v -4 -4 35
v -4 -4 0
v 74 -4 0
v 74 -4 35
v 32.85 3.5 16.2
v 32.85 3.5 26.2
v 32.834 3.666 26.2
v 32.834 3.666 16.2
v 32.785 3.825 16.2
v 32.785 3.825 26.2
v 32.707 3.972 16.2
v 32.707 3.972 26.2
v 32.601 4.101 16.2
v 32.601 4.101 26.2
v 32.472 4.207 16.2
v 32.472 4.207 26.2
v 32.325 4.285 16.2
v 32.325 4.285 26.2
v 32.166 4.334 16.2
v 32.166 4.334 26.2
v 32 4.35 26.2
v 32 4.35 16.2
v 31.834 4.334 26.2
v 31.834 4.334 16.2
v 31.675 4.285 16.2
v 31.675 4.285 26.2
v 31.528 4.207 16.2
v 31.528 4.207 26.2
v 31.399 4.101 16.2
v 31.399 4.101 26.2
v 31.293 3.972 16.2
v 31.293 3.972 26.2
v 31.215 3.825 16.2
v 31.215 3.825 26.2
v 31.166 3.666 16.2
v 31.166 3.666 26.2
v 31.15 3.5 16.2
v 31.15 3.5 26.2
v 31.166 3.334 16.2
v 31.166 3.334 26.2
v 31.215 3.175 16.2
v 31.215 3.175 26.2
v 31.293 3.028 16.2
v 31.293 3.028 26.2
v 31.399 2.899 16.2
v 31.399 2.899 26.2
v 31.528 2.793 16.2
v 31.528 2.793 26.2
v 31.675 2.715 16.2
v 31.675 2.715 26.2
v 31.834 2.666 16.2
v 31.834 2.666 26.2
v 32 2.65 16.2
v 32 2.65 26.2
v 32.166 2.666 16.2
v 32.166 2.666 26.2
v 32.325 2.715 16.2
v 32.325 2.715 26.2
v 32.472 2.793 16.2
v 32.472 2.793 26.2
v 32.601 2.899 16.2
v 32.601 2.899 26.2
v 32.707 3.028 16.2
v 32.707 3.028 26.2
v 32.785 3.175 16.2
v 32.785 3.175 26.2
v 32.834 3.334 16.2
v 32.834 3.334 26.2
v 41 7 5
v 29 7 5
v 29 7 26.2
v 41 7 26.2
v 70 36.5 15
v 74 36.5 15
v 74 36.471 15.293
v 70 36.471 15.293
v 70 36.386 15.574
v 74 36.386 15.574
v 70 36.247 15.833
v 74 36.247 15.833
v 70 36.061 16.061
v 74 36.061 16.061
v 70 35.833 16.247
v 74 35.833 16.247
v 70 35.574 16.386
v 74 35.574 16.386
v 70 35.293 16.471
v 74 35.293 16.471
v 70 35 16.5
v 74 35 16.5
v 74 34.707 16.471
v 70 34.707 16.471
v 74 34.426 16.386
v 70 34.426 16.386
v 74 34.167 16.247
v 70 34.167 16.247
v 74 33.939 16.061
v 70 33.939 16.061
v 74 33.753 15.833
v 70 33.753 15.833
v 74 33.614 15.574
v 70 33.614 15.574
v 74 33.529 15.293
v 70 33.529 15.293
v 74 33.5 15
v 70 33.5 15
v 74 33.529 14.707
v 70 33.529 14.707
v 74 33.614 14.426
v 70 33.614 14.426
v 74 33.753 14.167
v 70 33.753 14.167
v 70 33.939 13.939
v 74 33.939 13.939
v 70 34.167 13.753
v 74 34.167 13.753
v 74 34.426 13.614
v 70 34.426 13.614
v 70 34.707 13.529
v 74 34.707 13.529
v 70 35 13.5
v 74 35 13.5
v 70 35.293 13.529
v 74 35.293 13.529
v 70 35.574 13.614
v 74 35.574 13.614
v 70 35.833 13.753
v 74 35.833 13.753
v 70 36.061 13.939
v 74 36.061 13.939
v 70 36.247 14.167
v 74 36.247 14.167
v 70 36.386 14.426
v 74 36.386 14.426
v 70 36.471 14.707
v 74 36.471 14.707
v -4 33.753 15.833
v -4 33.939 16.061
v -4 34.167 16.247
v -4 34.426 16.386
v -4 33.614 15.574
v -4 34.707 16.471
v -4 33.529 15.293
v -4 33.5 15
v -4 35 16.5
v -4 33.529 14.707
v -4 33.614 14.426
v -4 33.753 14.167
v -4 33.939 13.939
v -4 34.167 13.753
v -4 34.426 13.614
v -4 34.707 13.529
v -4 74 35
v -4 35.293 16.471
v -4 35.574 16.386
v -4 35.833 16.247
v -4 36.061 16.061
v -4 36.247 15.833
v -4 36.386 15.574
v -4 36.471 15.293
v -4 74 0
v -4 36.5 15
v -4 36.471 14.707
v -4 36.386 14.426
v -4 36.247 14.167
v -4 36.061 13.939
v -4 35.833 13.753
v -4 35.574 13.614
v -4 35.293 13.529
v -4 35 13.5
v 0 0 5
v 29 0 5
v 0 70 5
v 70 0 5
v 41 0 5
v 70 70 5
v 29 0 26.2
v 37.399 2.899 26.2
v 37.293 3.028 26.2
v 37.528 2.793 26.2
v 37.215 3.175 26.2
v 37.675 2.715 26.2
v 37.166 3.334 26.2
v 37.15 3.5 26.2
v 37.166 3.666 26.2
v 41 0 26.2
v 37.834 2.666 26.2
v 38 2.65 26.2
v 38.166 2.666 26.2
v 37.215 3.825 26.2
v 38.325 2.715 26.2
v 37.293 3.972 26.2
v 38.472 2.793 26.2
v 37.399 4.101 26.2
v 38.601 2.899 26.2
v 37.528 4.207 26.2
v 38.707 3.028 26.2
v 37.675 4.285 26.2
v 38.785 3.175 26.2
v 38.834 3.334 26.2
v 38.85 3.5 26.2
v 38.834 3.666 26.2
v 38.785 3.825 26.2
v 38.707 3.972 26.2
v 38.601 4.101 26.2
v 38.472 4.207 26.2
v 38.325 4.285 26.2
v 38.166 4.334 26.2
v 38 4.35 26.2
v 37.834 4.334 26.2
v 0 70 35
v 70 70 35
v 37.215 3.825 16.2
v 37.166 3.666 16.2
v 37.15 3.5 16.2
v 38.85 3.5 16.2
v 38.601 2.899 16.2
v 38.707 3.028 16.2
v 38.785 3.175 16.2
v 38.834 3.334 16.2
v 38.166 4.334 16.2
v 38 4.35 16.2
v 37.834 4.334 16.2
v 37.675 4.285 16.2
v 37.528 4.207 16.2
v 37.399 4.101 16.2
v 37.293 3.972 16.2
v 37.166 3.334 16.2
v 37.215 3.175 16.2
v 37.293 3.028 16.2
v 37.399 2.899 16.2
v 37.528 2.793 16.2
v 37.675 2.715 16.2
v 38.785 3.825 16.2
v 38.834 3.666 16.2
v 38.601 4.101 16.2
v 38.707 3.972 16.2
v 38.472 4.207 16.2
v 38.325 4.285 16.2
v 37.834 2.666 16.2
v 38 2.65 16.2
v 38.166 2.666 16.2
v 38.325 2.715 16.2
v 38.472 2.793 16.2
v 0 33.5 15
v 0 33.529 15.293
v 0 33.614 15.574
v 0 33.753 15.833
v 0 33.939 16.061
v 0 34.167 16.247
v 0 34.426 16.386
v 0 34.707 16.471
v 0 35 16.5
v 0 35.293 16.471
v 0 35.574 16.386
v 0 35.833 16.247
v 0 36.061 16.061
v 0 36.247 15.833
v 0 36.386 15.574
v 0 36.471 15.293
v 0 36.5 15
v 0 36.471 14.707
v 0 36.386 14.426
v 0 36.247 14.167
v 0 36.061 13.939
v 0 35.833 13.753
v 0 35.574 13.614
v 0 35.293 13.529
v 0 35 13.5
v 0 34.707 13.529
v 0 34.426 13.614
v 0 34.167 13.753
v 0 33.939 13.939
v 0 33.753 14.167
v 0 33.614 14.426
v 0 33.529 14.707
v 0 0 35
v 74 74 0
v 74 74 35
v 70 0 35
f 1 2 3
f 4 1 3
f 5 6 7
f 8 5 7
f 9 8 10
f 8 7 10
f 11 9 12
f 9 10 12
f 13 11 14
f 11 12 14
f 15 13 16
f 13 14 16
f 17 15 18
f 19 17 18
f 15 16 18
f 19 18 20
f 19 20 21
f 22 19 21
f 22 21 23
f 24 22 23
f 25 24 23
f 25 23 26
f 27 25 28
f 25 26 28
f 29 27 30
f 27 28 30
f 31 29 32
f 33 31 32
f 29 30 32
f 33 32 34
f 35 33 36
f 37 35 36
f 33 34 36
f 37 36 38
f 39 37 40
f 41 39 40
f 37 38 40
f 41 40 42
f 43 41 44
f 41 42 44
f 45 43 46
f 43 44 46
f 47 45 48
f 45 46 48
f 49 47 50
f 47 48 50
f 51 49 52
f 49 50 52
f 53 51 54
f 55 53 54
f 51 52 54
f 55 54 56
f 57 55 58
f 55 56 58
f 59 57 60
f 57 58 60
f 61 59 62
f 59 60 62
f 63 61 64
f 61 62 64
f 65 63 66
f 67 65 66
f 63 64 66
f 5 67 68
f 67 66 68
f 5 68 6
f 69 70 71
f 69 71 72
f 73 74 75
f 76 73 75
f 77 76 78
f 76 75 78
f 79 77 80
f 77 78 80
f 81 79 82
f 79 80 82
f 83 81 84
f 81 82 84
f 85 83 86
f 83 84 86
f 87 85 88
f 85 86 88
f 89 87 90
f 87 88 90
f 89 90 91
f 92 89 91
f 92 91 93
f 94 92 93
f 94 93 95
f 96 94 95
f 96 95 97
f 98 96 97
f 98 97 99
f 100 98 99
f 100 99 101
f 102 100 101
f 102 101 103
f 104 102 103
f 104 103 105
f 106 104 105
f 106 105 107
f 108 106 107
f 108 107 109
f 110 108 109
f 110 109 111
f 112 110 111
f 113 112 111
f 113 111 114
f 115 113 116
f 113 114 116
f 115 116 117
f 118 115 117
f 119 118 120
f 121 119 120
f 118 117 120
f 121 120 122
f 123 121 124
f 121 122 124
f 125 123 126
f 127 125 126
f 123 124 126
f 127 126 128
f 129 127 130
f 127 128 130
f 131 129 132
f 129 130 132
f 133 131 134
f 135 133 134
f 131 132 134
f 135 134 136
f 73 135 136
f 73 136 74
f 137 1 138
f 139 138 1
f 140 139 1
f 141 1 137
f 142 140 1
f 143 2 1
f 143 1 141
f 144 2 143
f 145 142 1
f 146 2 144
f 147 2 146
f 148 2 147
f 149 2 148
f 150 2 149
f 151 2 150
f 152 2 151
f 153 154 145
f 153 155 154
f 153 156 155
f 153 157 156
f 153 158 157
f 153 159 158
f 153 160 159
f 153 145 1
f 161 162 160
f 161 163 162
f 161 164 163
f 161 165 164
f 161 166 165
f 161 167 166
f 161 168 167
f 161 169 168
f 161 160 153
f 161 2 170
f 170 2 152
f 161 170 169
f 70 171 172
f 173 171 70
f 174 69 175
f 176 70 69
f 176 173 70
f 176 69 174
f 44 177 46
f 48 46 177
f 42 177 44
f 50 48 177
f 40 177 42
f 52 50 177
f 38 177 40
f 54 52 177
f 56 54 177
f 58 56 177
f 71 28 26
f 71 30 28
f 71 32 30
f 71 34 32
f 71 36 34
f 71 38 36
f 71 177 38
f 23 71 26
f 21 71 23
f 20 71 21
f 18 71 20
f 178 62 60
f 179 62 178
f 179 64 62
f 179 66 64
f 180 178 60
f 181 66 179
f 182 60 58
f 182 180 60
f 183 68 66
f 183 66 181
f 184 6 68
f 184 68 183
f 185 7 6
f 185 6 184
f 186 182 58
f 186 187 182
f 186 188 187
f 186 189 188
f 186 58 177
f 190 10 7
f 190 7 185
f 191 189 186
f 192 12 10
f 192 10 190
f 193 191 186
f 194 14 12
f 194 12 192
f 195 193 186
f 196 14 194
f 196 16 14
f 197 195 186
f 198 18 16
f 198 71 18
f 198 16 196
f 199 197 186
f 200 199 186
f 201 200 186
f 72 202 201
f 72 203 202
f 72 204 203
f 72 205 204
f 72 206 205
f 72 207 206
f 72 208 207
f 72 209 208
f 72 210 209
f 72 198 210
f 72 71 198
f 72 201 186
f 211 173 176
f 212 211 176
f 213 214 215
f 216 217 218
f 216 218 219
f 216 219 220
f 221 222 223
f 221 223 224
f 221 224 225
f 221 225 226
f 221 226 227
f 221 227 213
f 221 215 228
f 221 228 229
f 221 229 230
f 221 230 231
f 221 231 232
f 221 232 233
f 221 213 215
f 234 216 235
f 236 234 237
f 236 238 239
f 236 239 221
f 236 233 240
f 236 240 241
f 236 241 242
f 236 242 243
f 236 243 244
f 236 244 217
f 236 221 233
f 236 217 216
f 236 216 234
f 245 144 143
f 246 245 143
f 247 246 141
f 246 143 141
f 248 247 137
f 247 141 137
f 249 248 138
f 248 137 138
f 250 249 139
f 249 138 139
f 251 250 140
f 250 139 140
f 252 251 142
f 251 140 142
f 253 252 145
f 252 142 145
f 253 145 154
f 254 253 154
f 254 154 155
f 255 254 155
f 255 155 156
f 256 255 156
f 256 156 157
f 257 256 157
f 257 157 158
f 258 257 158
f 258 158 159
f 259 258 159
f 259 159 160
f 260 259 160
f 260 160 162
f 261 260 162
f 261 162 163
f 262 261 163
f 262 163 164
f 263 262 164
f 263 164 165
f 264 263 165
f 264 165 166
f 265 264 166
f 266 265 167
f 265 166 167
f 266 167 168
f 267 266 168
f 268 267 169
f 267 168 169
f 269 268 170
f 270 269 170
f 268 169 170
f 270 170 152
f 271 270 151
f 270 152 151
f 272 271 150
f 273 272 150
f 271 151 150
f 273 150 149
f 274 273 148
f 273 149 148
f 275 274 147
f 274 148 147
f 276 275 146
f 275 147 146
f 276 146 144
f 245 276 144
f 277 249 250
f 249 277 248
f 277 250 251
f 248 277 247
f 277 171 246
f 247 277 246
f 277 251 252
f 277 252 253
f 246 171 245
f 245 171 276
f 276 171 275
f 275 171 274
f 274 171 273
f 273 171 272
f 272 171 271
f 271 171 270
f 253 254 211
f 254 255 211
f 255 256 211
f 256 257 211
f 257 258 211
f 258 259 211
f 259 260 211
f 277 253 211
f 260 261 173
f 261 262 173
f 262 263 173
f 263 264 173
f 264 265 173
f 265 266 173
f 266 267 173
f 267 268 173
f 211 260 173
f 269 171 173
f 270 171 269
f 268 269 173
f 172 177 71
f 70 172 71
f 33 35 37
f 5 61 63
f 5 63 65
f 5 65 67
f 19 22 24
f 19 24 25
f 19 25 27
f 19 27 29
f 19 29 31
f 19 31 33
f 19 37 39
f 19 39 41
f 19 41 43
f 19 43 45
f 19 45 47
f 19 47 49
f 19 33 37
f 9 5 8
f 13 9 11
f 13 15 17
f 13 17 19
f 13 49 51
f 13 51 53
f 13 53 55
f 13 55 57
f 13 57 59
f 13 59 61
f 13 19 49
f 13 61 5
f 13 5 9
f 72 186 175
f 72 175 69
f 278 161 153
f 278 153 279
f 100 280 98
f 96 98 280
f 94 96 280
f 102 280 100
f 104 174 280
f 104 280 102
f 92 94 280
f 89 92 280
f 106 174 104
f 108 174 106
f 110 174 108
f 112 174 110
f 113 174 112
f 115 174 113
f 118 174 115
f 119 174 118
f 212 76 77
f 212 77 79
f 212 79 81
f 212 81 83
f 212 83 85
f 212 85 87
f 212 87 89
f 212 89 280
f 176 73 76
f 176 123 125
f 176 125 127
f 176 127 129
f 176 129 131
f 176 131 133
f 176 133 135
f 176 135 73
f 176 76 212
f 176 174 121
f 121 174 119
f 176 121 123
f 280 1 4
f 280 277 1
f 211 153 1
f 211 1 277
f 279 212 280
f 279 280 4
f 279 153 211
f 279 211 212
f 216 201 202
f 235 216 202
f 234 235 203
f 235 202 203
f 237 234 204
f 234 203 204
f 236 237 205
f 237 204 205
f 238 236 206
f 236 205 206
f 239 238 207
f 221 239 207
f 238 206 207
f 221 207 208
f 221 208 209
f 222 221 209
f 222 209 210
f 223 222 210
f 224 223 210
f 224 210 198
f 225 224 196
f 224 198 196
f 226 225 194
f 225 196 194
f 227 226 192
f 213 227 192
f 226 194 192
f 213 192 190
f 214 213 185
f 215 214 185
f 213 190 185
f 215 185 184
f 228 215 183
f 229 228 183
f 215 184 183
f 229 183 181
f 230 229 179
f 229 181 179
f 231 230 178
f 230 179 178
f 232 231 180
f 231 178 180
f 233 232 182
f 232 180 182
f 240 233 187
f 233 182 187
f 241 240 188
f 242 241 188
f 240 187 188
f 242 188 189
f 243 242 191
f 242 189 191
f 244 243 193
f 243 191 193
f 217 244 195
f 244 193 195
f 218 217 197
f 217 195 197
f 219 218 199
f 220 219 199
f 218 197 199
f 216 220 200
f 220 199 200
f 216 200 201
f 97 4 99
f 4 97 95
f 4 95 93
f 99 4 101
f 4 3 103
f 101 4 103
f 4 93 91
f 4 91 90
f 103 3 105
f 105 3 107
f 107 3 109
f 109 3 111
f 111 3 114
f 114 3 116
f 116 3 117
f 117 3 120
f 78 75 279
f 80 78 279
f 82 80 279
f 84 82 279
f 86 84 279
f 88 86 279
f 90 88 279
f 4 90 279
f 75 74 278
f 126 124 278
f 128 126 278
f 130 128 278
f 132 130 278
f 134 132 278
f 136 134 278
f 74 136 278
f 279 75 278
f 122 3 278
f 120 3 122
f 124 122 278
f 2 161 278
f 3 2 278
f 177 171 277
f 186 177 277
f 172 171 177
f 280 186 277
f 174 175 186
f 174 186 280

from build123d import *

# Parameters (mm, degrees)
F0_W      = 78
F0_H      = 78
F0_W_2    = 70
F0_H_2    = 70
F1_DEPTH  = 35
F2_W      = 70
F2_H      = 70
F3_DEPTH  = 5
F4_W      = 12
F4_H      = 7
F5_DEPTH  = 26.2
F7_R      = 0.85
F8_DEPTH  = 10
F10_R     = 1.5
F11_DEPTH = 25.4
F13_R     = 1.5
F14_DEPTH = 25.4


with BuildPart() as f1:
    # F0 (on Top) → F1 (new body)
    with BuildSketch(Plane.XY):
        with Locations((35, 35)):
            Rectangle(F0_W, F0_H)
        with Locations((35, 35)):
            Rectangle(F0_W_2, F0_H_2, mode=Mode.SUBTRACT)
    extrude(amount=F1_DEPTH)

    # F2 (on Top) → F3 (join)
    with BuildSketch(Plane.XY):
        with Locations((35, 35)):
            Rectangle(F2_W, F2_H)
    extrude(amount=F3_DEPTH)

    # F4 (on Top) → F5 (join)
    with BuildSketch(Plane.XY):
        with Locations((35, 3.5)):
            Rectangle(F4_W, F4_H)
    extrude(amount=F5_DEPTH)

    # F7 (on offset) → F8 (cut)
    with BuildSketch(Plane.XY.offset(26.2)):
        with Locations((38, 3.5)):
            Circle(F7_R)
        with Locations((32, 3.5)):
            Circle(F7_R)
    extrude(amount=-F8_DEPTH, mode=Mode.SUBTRACT)

    # F10 (on offset) → F11 (cut)
    with BuildSketch(Plane.YZ.offset(74)):
        with Locations((35, 15)):
            Circle(F10_R)
    extrude(amount=-F11_DEPTH, mode=Mode.SUBTRACT)

    # F13 (on offset) → F14 (cut)
    with BuildSketch(Plane(origin=(-4, 0, 0), x_dir=(0, -1, 0), z_dir=(-1, 0, 0))):
        with Locations((-35, 15)):
            Circle(F13_R)
    extrude(amount=-F14_DEPTH, mode=Mode.SUBTRACT)


solid = f1.part
